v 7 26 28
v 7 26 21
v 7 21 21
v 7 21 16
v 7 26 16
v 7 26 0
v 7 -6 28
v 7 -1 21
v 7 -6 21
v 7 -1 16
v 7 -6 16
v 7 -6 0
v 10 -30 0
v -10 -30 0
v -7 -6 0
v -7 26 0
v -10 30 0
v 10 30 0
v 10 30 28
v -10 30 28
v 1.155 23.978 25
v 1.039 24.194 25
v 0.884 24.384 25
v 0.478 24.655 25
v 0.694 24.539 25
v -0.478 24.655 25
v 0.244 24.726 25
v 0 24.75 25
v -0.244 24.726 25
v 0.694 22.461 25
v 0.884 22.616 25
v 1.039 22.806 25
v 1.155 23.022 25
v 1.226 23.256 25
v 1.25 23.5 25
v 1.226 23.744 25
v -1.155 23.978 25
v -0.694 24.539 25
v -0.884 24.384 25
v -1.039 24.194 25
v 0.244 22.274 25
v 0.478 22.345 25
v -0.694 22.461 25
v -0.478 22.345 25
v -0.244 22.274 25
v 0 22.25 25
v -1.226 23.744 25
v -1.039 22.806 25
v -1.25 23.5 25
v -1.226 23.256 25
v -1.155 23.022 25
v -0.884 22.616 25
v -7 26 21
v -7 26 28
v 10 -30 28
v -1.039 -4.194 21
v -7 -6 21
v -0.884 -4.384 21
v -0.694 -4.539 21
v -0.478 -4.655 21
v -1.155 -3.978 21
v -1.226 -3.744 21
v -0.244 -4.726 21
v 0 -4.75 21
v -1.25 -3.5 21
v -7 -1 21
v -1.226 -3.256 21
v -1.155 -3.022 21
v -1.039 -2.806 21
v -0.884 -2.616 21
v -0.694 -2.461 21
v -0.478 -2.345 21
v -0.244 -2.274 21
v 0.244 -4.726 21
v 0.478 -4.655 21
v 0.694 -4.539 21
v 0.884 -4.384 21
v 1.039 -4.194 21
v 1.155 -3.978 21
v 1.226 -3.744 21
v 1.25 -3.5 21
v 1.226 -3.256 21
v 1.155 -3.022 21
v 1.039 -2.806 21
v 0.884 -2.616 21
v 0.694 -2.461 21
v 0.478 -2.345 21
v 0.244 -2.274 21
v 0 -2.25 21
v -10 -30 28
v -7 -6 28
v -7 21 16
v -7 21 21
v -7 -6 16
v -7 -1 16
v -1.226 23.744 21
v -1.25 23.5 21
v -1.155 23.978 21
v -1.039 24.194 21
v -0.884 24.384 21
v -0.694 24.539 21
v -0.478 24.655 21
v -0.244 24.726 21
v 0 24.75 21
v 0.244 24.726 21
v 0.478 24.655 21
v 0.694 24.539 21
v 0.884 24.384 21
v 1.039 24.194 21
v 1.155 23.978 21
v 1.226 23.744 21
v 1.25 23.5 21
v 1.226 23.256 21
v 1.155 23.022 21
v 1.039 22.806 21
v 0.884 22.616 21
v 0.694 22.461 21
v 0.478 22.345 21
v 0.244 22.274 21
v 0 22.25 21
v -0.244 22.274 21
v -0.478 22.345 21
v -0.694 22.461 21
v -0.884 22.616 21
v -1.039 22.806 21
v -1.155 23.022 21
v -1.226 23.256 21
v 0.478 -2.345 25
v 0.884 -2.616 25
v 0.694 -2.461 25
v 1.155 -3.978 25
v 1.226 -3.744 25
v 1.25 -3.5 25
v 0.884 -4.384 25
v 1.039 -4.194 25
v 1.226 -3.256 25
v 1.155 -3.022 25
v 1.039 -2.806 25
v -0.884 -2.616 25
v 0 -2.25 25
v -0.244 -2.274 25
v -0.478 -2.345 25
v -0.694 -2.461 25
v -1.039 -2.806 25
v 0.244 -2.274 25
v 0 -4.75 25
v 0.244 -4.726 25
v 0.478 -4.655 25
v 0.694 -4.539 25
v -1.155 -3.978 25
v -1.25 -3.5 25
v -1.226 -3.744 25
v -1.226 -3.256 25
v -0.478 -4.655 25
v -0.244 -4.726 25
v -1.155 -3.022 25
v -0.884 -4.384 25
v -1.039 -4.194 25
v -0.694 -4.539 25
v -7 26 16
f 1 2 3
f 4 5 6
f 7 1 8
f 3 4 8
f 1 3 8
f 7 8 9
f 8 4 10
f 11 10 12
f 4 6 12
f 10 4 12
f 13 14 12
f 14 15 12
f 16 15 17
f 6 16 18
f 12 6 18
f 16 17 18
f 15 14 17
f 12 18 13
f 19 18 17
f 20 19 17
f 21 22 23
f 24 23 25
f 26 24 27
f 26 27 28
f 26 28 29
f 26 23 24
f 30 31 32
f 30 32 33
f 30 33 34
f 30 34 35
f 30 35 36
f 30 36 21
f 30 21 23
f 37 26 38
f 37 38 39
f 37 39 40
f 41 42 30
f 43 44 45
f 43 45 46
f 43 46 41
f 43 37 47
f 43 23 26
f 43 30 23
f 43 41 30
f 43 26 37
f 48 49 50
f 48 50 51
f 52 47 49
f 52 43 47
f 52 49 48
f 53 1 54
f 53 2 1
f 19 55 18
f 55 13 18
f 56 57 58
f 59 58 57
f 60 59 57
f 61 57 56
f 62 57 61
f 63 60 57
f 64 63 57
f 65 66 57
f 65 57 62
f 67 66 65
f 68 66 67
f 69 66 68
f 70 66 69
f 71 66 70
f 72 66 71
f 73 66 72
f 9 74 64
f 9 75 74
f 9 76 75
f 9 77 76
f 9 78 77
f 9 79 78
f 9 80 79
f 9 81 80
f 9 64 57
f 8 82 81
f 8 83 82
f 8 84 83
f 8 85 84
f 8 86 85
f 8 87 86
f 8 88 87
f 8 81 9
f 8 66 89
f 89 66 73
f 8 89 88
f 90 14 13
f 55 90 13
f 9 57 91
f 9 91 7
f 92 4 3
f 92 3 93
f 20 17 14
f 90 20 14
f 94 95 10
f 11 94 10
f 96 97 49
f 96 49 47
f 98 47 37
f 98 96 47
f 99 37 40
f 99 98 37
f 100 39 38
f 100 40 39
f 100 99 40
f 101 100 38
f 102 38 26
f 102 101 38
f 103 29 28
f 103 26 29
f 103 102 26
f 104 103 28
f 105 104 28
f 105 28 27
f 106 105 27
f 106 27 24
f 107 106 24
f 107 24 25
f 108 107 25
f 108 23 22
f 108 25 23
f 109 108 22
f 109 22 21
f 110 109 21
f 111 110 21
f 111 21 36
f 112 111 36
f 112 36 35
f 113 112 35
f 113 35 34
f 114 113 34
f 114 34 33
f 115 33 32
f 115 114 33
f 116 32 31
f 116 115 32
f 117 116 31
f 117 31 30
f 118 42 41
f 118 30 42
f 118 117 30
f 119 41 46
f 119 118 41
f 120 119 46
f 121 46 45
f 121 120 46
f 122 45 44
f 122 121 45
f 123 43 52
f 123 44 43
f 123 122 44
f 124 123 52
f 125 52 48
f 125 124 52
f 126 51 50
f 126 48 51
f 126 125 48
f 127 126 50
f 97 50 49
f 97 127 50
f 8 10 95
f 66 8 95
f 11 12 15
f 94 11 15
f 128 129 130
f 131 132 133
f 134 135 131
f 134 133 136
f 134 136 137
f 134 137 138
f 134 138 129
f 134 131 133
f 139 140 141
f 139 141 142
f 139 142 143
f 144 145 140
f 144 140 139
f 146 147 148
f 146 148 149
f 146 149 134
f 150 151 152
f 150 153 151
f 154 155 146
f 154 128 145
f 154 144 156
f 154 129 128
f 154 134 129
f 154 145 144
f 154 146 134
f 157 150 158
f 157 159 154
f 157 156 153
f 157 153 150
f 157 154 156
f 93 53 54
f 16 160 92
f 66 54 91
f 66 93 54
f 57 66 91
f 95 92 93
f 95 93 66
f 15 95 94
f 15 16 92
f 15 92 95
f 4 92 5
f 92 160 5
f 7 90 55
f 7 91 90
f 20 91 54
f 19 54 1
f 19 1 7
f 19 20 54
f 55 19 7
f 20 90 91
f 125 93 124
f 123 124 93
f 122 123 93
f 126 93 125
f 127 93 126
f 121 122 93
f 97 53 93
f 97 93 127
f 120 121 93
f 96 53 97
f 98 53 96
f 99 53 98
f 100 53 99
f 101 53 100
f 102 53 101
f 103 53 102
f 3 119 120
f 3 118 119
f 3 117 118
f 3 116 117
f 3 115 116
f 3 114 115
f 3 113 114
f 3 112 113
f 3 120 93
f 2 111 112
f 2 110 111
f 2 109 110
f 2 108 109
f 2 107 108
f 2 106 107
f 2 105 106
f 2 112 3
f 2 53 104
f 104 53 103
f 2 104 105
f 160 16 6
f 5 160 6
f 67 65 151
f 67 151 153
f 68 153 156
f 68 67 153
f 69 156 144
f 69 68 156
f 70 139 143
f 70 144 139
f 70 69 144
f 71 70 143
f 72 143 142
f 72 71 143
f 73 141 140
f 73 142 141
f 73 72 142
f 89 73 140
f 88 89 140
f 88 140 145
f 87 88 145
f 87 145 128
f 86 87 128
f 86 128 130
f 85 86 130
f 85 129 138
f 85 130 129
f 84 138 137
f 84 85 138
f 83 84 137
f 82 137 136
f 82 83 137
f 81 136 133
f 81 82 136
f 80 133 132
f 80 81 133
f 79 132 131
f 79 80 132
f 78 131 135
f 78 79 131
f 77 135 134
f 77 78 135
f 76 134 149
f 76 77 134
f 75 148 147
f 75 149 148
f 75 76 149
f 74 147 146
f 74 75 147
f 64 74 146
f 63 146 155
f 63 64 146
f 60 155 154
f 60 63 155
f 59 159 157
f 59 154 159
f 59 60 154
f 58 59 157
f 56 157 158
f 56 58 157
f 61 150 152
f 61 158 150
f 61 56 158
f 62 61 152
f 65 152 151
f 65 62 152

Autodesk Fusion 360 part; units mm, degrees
sketch "Sketch1" plane through (0, 0, 0) normal (0, 0, 1) x (1, 0, 0) in component "Elbow"
  line L0 (10, 30) -> (-10, 30)
  line L1 (-10, 30) -> (-10, -30)
  line L2 (-10, -30) -> (10, -30)
  line L3 (10, -30) -> (10, 30)
  line L4 (10, 30) -> (-10, -30) construction
  line L5 (-10, 30) -> (10, -30) construction
  line L6 (7, 26) -> (-7, 26)
  line L7 (-7, 26) -> (-7, -6)
  line L8 (-7, -6) -> (7, -6)
  line L9 (7, -6) -> (7, 26)
  line L10 (7, 26) -> (-7, -6) construction
  line L11 (-7, 26) -> (7, -6) construction
  point P0 (0, 10)
extrude "Extrude1" add sketch "Sketch1" along normal blind 28 in component "Elbow"
sketch "Sketch2" plane through (0, 0, 0) normal (0, 0, 1) x (1, 0, 0) in component "Elbow"
  line L0 (-7, -6) -> (7, -6)
  line L1 (7, -6) -> (7, -1)
  line L2 (7, -1) -> (-7, -1)
  line L3 (-7, -1) -> (-7, -6)
  line L4 (-7, 26) -> (7, 26)
  line L5 (7, 26) -> (7, 21)
  line L6 (7, 21) -> (-7, 21)
  line L7 (-7, 21) -> (-7, 26)
extrude "Extrude2" add sketch "Sketch2" along normal blind 21 in component "Elbow"
sketch "Sketch3" plane through (0, 0, 0) normal (0, 0, 1) x (1, 0, 0) in component "Elbow"
  line L0 (-7, -1) -> (7, -1)
  line L1 (7, -1) -> (7, -6)
  line L2 (7, -6) -> (-7, -6)
  line L3 (-7, -6) -> (-7, -1)
  line L4 (-7, 26) -> (7, 26)
  line L5 (7, 26) -> (7, 21)
  line L6 (7, 21) -> (-7, 21)
  line L7 (-7, 21) -> (-7, 26)
extrude "Extrude3" cut sketch "Sketch3" along normal blind 16 in component "Elbow"
sketch "Sketch4" plane through (0, 0, 21) normal (0, 0, 1) x (-1, 0, 0) in component "Elbow"
  line L0 (7, 1) -> (7, 6)
  line L1 (7, 6) -> (-7, 6)
  line L2 (-7, 6) -> (-7, 1)
  line L3 (-7, 1) -> (7, 1)
  circle A0 centre (0, 3.5) radius 1.25
  dimension "d7" = 2.5
extrude "Extrude4" add sketch "Sketch4" along normal blind 4 contours A0 in component "Elbow"
sketch "Sketch5" plane through (0, 0, 21) normal (0, 0, 1) x (-1, 0, 0) in component "Elbow"
  line L0 (7, -21) -> (-7, -21)
  line L1 (-7, -21) -> (-7, -26)
  line L2 (-7, -26) -> (7, -26)
  line L3 (7, -26) -> (7, -21)
  circle A0 centre (0, -23.5) radius 1.25
  dimension "d10" = 2.5
extrude "Extrude5" add sketch "Sketch5" along normal blind 4 contours A0 in component "Elbow"
component "Elbow" placed x (1, 0, 0) y (0, 1, 0) z (0, 0, 1) at (0, 0, 0)
